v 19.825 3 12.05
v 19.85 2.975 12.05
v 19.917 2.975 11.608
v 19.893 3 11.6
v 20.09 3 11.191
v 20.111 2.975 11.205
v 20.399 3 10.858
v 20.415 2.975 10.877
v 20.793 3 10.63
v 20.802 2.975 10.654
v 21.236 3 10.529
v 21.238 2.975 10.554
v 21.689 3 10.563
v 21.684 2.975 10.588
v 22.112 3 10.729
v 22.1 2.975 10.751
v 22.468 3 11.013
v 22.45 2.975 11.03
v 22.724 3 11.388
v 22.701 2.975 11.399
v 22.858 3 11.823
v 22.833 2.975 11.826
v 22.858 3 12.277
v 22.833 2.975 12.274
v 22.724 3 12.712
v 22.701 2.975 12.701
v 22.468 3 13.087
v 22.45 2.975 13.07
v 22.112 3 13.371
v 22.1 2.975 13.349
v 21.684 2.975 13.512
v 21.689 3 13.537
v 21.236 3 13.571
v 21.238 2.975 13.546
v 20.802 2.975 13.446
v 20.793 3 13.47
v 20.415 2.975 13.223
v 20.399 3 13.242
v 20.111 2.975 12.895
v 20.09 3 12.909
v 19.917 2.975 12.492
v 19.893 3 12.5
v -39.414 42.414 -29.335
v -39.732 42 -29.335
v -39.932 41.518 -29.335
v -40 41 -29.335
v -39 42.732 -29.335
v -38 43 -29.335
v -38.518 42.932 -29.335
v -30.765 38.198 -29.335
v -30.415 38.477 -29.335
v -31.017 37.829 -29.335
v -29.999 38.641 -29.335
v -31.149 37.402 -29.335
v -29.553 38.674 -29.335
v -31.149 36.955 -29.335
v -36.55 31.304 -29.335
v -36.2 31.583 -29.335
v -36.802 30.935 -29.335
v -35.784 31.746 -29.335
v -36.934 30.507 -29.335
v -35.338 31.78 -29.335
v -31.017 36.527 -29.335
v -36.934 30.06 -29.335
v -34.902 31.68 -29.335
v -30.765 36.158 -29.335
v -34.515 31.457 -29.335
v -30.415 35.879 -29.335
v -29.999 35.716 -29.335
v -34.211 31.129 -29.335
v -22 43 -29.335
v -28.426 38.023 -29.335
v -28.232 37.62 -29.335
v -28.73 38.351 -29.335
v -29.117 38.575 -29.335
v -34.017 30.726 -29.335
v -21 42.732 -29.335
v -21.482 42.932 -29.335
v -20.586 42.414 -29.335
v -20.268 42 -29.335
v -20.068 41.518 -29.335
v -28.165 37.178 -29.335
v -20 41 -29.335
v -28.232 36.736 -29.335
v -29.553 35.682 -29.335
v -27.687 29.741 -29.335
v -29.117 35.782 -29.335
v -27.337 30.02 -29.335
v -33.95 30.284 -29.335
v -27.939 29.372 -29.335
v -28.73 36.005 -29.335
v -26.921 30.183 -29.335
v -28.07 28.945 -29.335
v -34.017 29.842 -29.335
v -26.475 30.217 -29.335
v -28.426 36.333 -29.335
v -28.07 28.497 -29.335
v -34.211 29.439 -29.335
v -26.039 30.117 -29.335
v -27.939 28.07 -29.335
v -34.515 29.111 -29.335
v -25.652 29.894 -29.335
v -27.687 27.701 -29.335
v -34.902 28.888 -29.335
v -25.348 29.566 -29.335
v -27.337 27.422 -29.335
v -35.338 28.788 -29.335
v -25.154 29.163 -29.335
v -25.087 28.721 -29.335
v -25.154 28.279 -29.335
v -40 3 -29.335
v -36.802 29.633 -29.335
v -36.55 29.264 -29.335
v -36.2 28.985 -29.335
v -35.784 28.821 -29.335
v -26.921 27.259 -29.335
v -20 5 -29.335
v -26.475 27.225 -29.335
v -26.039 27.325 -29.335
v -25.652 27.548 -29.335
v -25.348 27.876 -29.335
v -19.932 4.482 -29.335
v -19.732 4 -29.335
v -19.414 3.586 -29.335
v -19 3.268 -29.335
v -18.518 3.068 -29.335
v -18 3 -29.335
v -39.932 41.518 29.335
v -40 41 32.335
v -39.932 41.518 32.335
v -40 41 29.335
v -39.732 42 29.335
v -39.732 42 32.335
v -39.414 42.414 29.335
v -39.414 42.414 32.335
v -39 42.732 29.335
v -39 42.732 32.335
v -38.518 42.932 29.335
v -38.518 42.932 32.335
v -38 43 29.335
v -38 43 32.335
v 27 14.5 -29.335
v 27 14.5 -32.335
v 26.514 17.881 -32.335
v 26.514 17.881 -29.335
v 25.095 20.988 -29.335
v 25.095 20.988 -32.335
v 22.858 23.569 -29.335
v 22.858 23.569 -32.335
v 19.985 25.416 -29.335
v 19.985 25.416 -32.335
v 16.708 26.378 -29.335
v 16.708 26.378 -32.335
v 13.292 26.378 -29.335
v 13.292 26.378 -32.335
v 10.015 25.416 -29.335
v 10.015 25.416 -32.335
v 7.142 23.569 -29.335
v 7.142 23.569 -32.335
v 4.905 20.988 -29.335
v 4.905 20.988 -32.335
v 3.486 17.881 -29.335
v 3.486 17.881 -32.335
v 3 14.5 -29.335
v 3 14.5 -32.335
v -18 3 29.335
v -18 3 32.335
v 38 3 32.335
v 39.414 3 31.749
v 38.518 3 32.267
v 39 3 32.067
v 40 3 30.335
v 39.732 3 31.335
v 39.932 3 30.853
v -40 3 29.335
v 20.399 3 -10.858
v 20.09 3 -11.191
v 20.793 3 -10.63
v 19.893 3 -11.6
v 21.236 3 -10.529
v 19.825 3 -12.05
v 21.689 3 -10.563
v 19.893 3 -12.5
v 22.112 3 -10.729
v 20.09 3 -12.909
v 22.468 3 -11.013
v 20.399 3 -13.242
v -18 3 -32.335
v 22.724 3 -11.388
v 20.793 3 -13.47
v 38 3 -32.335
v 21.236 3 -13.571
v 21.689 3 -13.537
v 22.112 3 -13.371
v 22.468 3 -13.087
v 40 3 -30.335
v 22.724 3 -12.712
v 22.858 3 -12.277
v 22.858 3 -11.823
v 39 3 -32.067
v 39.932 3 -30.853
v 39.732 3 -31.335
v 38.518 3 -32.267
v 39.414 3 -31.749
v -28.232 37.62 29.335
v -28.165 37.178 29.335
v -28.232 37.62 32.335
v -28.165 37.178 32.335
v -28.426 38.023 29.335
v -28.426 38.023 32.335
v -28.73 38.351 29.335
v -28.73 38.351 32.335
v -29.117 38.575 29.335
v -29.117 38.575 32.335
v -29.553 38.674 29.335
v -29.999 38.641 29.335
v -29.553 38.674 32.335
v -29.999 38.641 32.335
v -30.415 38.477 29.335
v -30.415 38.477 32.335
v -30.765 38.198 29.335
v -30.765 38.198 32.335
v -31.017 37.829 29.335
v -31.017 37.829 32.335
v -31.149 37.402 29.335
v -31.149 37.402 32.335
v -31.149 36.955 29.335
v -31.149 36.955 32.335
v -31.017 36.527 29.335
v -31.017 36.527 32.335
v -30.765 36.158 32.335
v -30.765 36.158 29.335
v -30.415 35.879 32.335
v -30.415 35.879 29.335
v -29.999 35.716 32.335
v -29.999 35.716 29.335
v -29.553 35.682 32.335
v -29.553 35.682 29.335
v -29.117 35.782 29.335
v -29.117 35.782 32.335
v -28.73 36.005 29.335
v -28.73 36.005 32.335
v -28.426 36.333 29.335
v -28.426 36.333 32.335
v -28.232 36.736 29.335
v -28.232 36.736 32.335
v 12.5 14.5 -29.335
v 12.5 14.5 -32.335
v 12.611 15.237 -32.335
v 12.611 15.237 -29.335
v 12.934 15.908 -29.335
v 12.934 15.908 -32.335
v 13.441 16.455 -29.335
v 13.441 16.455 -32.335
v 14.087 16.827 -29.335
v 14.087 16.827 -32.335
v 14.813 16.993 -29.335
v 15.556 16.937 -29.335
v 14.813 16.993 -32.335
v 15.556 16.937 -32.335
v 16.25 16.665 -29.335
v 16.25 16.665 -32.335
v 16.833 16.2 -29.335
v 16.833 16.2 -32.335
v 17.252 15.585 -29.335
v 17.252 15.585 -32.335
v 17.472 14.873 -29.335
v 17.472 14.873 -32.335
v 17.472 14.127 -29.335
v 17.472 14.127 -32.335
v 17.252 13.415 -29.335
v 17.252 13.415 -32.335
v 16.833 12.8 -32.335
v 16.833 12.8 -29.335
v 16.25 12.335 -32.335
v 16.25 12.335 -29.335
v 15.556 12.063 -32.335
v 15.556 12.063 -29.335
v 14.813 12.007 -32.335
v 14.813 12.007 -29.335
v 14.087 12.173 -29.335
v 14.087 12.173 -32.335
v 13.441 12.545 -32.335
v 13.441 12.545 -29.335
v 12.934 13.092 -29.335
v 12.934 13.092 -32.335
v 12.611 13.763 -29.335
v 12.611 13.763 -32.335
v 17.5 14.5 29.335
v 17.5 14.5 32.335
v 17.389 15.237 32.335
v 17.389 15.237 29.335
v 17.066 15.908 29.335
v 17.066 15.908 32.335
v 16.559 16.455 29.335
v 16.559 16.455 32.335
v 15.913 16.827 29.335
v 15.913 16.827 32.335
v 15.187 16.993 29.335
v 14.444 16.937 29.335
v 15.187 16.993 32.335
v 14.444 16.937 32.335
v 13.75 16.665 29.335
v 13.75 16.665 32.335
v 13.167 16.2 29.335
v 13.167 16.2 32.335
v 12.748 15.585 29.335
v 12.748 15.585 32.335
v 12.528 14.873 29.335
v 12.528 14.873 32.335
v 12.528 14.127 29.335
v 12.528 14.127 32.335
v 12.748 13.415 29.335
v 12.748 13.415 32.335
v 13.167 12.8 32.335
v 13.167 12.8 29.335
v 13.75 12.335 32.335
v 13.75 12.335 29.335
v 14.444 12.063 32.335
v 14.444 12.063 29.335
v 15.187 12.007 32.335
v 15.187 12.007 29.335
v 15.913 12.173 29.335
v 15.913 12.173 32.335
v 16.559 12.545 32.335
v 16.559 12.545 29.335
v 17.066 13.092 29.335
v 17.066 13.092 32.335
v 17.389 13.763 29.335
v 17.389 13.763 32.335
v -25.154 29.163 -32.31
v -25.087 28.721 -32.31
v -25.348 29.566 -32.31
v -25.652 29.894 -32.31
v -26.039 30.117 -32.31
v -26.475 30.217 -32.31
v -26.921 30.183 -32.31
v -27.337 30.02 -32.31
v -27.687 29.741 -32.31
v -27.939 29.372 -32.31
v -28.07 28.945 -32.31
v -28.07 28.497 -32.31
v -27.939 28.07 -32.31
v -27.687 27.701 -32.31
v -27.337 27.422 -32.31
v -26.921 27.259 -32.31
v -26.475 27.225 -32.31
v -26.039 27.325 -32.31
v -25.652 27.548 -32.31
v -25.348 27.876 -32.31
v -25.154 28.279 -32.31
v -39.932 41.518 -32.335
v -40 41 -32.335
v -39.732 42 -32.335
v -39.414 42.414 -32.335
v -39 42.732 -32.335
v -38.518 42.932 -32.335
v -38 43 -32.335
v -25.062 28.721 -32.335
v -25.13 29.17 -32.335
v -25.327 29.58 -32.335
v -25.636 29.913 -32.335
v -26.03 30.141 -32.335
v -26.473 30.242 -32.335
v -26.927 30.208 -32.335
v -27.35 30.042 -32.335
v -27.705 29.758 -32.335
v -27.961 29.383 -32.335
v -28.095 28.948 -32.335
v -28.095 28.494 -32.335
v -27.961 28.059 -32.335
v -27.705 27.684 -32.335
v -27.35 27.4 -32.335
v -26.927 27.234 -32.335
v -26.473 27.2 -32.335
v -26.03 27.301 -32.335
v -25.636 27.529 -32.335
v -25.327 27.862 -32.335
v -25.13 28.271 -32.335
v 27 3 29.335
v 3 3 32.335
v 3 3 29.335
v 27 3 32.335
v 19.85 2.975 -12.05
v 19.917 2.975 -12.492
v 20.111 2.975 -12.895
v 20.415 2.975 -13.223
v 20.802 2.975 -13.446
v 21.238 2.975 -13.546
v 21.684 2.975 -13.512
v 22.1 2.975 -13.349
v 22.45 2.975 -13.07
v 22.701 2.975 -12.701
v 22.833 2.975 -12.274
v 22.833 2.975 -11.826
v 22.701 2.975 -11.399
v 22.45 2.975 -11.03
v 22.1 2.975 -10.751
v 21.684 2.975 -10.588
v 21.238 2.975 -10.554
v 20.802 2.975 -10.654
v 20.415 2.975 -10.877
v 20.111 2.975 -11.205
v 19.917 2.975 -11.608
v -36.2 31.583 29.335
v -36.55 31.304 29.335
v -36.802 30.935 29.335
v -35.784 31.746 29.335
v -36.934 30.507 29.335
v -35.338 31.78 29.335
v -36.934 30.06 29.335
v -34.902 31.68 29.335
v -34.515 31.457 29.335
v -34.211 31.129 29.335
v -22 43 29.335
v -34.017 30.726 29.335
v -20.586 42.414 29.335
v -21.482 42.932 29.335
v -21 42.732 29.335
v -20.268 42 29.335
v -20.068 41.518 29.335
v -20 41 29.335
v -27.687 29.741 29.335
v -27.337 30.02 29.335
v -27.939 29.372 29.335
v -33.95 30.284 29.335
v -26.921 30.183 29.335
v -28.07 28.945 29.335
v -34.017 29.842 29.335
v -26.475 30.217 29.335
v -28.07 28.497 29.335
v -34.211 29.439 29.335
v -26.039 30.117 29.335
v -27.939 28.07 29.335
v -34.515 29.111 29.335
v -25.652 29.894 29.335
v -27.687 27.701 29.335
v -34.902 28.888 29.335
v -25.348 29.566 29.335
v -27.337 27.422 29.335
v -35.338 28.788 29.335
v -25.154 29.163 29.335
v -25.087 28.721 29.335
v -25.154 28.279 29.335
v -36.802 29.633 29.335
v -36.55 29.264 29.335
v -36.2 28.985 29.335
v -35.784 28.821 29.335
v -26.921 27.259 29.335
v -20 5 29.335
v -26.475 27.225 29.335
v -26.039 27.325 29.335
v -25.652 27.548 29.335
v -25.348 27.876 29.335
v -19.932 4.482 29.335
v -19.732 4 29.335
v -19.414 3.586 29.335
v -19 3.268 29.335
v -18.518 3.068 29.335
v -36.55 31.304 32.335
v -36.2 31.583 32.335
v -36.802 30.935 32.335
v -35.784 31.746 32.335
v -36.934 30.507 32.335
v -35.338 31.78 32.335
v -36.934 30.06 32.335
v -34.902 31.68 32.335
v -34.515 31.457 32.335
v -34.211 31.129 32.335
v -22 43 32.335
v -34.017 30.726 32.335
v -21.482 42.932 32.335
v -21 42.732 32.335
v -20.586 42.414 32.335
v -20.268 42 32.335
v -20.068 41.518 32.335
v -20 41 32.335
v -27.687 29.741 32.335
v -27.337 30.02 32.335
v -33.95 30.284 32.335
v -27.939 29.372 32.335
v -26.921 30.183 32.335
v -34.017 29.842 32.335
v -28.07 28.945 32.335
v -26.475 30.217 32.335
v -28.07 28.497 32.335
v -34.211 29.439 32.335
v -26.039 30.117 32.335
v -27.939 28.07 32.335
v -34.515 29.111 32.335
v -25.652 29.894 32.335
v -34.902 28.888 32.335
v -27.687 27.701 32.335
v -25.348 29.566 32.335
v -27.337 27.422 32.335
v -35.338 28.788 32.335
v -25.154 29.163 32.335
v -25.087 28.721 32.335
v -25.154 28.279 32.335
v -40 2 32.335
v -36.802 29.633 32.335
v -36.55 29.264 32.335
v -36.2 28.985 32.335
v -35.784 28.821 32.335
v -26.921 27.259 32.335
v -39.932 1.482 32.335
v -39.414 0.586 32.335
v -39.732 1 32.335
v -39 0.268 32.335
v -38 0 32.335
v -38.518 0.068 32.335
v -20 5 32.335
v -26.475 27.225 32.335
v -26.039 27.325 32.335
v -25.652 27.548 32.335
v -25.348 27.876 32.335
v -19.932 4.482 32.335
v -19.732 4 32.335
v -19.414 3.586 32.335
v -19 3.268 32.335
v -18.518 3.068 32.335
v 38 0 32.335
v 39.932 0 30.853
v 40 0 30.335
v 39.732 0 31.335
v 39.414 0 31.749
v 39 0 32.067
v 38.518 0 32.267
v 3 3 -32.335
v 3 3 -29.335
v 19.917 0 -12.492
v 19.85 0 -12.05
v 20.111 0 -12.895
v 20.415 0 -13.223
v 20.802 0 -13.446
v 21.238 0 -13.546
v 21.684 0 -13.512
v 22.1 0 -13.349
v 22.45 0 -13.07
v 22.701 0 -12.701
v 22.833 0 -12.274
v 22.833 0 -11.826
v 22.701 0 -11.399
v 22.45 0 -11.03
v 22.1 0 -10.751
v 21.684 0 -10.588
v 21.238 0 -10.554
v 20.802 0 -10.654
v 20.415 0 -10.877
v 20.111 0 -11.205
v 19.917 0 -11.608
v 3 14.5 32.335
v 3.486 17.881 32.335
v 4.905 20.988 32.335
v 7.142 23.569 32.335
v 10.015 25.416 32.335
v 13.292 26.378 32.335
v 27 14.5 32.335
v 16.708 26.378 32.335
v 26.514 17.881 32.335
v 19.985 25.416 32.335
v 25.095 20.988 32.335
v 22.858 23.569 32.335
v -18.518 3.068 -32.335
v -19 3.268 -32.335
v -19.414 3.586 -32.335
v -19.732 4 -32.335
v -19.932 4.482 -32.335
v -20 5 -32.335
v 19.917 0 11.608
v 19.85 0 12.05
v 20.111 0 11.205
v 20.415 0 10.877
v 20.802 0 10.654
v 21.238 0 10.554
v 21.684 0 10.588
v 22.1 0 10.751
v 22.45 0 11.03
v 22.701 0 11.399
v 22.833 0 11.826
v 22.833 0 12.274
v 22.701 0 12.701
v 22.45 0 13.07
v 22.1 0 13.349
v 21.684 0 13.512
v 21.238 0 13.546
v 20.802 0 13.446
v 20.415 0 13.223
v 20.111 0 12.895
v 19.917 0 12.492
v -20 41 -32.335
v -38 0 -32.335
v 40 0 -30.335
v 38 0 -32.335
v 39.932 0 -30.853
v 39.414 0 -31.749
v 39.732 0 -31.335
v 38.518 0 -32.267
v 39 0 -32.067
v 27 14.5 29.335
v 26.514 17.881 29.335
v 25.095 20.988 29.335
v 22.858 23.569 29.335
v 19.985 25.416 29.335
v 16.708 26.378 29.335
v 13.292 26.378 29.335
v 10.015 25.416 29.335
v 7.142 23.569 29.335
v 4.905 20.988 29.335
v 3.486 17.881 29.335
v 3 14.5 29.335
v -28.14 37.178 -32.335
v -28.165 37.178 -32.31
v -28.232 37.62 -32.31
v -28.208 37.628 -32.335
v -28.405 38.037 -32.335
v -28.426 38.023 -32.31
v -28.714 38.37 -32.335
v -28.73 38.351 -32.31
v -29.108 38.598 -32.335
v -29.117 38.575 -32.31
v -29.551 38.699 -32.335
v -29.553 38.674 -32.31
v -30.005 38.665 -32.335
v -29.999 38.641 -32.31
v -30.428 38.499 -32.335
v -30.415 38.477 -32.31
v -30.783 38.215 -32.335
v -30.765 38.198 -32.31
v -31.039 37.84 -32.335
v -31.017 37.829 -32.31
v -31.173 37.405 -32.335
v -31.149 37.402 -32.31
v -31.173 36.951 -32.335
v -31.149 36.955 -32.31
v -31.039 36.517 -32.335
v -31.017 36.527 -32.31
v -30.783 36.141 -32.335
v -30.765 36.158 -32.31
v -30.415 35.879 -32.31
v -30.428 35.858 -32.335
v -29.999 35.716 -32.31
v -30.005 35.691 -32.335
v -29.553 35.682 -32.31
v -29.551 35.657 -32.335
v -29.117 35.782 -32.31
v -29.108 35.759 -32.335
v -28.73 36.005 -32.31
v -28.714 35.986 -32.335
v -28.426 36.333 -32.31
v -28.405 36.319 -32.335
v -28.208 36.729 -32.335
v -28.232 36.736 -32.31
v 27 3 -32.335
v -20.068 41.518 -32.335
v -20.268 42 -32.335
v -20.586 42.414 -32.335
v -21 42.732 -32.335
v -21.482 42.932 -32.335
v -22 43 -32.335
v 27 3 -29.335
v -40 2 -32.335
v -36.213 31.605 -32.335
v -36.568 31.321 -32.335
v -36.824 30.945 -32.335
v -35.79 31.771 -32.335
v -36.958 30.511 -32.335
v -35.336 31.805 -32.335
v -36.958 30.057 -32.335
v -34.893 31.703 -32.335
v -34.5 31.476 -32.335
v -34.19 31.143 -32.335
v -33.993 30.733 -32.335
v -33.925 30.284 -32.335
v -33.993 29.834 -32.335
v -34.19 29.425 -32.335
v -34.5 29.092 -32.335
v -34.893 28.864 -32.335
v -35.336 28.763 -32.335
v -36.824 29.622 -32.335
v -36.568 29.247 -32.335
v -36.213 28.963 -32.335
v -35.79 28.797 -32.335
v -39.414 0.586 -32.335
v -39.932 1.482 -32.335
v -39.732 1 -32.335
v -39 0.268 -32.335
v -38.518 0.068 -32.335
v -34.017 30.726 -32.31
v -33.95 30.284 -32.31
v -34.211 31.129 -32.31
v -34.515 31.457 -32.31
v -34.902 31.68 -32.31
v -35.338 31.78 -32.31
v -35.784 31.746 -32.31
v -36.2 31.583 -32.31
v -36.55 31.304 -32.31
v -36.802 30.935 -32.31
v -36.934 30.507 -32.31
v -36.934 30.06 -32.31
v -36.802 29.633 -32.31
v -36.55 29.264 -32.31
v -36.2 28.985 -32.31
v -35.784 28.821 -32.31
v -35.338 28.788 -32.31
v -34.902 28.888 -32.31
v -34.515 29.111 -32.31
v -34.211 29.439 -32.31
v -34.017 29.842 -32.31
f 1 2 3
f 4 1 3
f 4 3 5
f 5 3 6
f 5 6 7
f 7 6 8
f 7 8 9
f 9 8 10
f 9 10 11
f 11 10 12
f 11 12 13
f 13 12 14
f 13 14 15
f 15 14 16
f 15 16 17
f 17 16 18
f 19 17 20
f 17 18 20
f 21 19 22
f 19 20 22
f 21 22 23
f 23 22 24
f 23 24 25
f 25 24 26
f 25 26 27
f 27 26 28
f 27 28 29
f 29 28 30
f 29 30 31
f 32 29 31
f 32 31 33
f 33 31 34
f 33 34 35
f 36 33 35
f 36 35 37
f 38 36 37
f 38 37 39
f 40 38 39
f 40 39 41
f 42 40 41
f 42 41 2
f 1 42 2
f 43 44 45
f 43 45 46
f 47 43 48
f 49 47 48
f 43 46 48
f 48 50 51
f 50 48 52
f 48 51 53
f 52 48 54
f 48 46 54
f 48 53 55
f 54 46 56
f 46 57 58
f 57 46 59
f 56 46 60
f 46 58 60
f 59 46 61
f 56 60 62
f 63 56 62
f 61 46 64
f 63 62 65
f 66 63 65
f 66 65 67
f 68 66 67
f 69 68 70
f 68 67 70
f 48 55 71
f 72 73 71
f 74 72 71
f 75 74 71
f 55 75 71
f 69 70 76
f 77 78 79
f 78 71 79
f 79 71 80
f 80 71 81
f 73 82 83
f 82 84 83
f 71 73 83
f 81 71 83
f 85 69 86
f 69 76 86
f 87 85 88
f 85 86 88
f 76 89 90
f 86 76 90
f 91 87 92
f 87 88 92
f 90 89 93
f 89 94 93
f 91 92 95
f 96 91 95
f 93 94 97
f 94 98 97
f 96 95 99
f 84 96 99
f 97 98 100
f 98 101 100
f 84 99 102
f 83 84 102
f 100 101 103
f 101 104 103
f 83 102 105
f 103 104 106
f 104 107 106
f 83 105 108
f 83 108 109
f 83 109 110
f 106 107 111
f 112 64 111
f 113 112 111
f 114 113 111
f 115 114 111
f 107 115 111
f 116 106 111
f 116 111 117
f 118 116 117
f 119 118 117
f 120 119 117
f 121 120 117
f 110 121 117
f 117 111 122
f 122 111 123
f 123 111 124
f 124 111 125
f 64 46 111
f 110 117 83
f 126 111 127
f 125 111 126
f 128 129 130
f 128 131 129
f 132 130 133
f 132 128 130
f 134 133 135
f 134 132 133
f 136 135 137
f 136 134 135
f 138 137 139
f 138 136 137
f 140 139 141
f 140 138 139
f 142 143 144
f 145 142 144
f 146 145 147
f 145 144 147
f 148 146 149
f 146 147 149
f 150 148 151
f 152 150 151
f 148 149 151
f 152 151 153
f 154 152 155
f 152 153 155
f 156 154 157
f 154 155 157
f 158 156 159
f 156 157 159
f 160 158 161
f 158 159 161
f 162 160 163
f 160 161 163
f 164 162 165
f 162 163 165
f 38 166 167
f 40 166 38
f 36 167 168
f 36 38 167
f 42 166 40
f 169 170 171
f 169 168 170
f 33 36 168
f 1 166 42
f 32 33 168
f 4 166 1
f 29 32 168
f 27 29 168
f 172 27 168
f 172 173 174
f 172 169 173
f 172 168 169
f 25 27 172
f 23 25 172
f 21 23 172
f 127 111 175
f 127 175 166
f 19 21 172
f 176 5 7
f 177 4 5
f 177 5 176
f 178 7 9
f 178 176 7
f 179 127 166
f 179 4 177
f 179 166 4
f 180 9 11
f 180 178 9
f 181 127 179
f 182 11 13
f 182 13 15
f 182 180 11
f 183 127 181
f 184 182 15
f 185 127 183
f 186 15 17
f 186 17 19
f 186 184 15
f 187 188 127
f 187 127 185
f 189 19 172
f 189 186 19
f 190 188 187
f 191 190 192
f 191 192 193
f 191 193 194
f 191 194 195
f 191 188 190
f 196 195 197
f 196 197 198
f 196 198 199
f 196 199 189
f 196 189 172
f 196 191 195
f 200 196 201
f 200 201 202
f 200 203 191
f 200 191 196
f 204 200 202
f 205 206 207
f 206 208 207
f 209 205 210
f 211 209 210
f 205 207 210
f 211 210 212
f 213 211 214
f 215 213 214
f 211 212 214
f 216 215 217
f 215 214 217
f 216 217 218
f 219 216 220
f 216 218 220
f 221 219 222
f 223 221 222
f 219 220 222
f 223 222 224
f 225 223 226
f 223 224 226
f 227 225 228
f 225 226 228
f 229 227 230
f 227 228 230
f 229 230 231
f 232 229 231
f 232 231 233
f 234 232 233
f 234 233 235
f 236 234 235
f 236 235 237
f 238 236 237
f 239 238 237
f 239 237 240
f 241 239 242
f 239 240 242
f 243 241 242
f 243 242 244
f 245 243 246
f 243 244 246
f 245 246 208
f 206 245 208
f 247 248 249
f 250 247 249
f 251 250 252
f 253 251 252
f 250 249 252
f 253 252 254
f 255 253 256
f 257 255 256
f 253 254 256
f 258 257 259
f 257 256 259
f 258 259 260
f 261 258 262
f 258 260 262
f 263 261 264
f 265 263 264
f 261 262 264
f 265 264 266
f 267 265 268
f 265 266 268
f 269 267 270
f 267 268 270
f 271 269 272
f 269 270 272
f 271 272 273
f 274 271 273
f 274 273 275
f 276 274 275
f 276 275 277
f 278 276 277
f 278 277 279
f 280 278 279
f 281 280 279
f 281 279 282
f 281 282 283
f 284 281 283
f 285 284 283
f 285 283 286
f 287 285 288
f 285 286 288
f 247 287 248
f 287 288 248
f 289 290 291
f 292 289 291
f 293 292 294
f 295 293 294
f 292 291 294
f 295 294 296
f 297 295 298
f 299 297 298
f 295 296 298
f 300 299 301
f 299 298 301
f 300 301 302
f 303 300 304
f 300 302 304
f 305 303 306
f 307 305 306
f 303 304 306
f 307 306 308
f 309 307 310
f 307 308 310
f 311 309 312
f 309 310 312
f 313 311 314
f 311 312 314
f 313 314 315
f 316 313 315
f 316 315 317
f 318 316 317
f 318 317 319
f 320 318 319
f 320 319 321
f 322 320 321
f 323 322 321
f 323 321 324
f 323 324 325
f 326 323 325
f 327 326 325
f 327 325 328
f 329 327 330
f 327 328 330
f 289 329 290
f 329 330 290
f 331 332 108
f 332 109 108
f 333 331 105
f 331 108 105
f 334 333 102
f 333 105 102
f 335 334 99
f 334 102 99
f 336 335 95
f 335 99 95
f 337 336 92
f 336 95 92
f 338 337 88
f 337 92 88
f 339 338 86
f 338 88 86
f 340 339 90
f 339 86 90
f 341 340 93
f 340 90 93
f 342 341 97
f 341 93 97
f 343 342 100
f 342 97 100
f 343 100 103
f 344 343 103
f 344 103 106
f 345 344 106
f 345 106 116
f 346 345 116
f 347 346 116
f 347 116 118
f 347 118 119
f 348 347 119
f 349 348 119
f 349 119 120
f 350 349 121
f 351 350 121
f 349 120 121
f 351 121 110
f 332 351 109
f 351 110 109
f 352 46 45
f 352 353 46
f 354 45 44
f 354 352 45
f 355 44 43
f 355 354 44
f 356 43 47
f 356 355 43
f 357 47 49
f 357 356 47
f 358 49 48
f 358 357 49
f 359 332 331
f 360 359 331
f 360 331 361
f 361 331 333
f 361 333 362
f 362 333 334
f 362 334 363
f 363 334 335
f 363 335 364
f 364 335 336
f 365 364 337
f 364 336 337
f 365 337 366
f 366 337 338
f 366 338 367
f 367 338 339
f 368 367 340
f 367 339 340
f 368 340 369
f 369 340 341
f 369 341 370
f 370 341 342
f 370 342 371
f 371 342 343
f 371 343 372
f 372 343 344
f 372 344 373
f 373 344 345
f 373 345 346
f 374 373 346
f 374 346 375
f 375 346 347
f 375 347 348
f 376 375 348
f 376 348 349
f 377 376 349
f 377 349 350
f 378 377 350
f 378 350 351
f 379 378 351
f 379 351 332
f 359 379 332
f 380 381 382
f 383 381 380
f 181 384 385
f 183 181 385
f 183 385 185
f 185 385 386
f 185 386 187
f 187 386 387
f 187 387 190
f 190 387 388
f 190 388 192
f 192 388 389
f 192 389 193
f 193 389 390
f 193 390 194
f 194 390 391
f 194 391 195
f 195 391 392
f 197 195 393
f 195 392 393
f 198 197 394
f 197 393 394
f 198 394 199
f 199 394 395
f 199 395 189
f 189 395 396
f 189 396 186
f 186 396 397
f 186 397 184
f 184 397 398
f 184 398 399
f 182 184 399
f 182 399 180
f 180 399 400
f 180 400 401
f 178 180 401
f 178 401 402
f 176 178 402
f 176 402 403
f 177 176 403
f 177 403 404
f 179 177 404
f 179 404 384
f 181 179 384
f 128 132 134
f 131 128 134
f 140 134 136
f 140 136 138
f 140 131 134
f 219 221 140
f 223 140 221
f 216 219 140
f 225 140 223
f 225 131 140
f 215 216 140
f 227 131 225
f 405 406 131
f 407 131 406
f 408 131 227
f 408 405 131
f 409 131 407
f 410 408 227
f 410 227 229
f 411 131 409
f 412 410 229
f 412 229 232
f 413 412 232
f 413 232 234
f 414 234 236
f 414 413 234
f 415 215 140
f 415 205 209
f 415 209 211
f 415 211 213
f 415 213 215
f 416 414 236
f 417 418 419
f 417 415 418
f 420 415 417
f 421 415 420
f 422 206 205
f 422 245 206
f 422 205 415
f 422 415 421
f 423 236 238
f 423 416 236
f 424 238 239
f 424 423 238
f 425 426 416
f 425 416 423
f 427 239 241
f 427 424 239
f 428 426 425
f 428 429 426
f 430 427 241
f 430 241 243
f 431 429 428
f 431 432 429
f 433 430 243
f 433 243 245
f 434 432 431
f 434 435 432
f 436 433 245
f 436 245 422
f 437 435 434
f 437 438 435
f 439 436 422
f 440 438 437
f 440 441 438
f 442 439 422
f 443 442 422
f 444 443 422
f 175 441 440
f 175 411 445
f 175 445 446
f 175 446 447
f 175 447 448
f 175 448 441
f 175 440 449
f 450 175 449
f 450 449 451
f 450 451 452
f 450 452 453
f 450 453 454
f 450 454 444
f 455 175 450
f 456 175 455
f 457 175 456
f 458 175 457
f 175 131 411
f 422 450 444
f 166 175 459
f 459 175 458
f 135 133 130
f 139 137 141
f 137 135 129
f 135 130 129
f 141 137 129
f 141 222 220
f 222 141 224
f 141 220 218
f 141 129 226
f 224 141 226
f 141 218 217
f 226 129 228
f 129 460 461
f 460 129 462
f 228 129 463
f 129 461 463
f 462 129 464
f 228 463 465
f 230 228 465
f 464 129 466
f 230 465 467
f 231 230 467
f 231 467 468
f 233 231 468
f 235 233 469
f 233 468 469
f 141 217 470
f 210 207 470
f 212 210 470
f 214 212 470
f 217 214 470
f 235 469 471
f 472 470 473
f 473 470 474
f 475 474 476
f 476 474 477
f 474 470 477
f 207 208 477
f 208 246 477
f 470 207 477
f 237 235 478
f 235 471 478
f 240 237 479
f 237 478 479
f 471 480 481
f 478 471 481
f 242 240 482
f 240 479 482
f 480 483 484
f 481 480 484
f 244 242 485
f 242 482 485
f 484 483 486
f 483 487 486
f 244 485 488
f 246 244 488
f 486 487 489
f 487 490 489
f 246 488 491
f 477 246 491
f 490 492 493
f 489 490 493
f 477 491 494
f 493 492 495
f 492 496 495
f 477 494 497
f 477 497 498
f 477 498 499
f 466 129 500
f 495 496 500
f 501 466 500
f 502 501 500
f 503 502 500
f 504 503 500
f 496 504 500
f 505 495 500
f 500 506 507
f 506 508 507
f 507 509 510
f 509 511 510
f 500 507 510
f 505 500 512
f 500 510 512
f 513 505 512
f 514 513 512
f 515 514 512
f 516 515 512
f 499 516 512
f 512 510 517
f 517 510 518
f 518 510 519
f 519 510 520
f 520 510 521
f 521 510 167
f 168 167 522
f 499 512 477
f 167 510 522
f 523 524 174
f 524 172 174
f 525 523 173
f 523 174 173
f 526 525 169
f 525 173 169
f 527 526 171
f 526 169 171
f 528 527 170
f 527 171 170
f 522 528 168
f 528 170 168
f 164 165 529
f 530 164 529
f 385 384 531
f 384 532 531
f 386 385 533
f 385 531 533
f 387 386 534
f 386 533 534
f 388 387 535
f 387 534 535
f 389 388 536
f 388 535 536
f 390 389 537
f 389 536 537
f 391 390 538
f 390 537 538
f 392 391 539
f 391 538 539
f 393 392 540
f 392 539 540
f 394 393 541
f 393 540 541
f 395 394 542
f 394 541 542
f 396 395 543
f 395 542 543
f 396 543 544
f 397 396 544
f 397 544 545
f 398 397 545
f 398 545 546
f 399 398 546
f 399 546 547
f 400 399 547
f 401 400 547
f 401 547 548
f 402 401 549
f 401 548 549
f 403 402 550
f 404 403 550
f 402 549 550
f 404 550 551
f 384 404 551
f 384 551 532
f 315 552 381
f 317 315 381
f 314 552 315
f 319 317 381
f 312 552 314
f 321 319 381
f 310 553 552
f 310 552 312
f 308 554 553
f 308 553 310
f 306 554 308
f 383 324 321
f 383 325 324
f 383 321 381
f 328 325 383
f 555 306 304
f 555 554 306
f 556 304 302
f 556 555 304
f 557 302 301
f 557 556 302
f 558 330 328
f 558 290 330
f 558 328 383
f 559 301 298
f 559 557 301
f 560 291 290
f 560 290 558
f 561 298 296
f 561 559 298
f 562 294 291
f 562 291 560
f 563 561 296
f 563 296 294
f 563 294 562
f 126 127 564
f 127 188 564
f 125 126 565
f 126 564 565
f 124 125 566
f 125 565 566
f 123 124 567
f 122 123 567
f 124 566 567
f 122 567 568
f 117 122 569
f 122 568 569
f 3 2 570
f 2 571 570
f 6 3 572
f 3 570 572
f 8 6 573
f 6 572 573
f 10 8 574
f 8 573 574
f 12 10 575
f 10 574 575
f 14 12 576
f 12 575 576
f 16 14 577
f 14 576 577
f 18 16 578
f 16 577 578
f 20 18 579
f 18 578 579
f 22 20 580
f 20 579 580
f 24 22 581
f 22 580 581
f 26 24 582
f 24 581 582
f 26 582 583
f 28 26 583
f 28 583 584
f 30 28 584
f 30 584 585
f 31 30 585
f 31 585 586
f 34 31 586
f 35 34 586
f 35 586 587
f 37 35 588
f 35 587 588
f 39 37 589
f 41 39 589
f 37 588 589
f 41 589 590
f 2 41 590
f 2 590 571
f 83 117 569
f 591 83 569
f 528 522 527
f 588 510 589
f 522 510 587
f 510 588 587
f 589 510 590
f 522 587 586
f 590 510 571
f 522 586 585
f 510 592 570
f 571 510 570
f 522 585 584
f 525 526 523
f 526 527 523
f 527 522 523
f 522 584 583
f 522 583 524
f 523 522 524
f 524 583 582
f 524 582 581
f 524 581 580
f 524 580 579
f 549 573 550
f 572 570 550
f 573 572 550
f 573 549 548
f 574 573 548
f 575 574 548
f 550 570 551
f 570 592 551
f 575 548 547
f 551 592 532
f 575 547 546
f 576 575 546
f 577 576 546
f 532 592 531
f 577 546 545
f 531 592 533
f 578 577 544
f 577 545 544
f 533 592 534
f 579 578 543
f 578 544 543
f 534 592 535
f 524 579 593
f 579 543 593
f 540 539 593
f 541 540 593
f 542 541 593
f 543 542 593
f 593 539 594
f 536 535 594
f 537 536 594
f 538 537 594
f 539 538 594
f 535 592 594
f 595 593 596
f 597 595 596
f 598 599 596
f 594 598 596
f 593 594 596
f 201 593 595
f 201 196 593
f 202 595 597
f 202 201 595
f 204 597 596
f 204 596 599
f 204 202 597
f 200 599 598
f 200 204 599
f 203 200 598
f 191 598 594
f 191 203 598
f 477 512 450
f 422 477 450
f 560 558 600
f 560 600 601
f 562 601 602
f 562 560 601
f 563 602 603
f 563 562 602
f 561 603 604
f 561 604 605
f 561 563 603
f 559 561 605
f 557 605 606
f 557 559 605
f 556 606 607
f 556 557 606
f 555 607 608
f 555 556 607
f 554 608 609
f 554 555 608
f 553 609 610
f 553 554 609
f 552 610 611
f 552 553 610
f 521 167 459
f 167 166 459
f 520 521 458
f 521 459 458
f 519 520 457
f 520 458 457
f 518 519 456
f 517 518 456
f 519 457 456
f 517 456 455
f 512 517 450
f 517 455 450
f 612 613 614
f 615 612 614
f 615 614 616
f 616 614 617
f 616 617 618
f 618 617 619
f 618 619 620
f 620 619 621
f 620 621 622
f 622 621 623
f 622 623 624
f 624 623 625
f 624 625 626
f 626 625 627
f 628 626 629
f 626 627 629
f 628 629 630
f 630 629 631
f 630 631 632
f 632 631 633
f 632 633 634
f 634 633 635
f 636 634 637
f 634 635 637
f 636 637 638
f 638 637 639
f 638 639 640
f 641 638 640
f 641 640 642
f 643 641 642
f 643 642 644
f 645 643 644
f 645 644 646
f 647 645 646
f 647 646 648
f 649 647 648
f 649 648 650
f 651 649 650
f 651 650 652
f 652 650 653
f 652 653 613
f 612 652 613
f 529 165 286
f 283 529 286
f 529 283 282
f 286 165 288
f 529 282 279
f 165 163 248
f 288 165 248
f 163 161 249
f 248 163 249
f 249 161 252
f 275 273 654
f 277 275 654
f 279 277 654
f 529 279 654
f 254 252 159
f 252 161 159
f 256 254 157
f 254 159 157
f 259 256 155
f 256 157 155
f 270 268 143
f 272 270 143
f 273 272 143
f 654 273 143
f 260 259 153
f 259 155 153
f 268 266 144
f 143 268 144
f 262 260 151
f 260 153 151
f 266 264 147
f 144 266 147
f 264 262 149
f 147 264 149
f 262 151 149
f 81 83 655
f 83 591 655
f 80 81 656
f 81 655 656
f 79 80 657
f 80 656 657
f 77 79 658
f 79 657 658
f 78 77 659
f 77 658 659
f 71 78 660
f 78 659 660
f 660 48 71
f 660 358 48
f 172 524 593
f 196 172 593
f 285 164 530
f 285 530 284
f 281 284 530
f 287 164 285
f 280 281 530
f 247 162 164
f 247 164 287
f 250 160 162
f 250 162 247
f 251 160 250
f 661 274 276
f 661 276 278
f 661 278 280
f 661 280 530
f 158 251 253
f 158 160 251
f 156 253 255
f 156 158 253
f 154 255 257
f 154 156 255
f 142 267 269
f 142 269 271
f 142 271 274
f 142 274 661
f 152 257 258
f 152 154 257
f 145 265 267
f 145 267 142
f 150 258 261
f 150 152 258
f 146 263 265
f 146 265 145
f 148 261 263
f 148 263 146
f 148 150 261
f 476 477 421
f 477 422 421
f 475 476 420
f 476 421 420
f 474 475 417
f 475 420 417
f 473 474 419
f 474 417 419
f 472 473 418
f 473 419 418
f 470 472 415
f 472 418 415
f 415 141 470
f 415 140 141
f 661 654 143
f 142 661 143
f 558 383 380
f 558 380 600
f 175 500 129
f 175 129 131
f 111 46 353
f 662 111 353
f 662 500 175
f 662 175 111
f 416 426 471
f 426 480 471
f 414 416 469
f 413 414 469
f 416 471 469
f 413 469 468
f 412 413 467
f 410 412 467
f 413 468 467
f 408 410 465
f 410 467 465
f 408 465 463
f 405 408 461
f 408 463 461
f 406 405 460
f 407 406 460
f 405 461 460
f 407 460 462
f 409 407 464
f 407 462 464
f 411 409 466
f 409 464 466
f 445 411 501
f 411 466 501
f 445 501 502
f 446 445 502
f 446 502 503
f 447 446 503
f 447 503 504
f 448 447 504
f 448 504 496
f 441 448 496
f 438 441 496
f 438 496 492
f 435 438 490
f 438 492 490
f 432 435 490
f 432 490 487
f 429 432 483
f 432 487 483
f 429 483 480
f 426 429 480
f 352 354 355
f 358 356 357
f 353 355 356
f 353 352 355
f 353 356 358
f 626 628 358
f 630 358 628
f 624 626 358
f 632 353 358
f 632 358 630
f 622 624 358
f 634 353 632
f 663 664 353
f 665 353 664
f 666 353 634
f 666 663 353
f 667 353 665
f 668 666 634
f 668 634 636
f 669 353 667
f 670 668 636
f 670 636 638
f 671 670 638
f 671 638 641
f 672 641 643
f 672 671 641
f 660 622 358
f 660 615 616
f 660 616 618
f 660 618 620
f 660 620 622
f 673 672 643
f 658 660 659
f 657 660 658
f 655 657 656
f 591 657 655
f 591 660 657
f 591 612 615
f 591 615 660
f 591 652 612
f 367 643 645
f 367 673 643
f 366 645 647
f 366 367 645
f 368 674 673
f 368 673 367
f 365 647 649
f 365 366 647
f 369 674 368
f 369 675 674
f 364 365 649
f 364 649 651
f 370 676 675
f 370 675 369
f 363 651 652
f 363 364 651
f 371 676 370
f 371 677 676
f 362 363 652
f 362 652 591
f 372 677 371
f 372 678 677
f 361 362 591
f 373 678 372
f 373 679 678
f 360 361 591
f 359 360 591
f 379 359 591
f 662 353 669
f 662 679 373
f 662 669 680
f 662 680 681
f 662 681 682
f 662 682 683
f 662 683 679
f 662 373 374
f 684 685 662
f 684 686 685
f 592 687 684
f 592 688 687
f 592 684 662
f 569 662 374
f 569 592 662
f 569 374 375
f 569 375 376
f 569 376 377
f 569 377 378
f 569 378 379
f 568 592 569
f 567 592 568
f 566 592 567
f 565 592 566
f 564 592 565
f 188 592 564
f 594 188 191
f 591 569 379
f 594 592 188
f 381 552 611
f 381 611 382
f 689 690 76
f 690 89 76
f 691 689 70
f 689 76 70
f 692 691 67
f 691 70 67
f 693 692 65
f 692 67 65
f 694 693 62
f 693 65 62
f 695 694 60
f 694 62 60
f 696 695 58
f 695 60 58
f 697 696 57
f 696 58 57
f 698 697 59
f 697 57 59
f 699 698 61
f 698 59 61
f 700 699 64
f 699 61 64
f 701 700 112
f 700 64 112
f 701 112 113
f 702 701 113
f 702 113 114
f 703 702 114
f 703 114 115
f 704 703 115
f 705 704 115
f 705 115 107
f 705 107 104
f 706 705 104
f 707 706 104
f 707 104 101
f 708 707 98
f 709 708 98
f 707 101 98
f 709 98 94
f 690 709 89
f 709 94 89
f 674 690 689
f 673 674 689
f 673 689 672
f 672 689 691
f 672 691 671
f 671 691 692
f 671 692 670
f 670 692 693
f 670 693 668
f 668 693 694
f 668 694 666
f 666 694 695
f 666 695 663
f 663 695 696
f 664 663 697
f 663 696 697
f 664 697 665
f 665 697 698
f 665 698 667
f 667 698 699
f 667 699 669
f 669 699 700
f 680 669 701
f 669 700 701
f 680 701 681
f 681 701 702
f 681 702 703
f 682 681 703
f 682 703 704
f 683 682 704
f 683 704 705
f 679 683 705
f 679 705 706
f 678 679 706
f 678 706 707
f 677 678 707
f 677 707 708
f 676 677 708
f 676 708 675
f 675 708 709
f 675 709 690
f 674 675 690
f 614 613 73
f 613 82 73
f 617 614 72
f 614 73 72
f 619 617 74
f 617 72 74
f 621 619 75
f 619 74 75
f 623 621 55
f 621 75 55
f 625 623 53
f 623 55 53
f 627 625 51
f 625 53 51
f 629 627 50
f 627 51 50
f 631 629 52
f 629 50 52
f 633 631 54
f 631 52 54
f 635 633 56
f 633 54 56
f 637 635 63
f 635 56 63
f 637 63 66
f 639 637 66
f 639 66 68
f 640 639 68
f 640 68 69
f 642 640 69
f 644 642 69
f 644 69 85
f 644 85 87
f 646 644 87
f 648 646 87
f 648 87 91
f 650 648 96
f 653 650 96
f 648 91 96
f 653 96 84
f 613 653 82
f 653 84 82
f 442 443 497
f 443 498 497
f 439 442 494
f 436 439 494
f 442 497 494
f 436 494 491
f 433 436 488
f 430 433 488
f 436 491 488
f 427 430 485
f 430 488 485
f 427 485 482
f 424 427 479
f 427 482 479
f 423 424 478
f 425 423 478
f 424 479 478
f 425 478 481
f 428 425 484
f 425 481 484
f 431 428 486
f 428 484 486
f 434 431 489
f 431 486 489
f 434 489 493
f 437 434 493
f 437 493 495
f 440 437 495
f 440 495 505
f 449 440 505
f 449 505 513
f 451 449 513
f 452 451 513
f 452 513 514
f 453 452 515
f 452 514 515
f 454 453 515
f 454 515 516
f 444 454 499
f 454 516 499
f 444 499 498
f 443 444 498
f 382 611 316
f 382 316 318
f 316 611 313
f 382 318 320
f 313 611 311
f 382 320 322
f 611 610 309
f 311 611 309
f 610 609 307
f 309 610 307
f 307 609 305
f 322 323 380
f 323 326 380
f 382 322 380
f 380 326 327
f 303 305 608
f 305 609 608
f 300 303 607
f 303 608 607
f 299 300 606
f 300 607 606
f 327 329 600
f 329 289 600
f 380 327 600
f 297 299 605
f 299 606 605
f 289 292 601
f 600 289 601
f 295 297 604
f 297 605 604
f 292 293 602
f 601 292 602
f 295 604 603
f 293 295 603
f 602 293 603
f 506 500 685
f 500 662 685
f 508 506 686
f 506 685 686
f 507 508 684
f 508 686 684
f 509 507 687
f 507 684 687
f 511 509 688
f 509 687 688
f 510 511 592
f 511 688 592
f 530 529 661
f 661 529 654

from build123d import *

# Parameters (mm, degrees)
SKETCH1_W                       = 80
SKETCH1_H                       = 64.67
BOSS_EXTRUDE1_DEPTH             = 3
SKETCH2_W                       = 20
SKETCH2_H                       = 3
BOSS_EXTRUDE2_DEPTH             = 40
F_3_0MM_DOWEL_HOLE1_D           = 3
F_3_0MM_DOWEL_HOLE1_CSINK_D     = 3.05
F_3_0MM_DOWEL_HOLE1_CSINK_ANGLE = 90
FILLET1_R                       = 2
F_3_0MM_DOWEL_HOLE2_D           = 3
F_3_0MM_DOWEL_HOLE2_CSINK_D     = 3.05
F_3_0MM_DOWEL_HOLE2_CSINK_ANGLE = 90
SKETCH9_R                       = 2.5
BOSS_EXTRUDE3_DEPTH             = 3
SKETCH10_R                      = 2.5
BOSS_EXTRUDE4_DEPTH             = 3


with BuildPart() as part:
    # Sketch1 → Boss-Extrude1 (new body)
    with BuildSketch(Plane(origin=(0, 0, 0), x_dir=(1, 0, 0), z_dir=(0, 1, 0))):
        Rectangle(SKETCH1_W, SKETCH1_H)
    extrude(amount=BOSS_EXTRUDE1_DEPTH)

    # Sketch2 → Boss-Extrude2 (add)
    with BuildSketch(Plane(origin=(0, 3, 0), x_dir=(1, 0, 0), z_dir=(0, 1, 0))):
        with Locations((-30, 30.835)):
            Rectangle(SKETCH2_W, SKETCH2_H)
        with Locations((-30, -30.835)):
            Rectangle(SKETCH2_W, SKETCH2_H)
    extrude(amount=BOSS_EXTRUDE2_DEPTH)

    # Ø3.0mm Dowel Hole1 (through all)
    with Locations(Plane(origin=(0, 0, -32.335), x_dir=(-1, 0, 0), z_dir=(0, 0, -1))):
        with Locations((26.587155595, 28.720962624), (35.450420321, 30.283824867), (29.665309553, 37.178206159)):
            CounterSinkHole(F_3_0MM_DOWEL_HOLE1_D / 2, F_3_0MM_DOWEL_HOLE1_CSINK_D / 2, counter_sink_angle=F_3_0MM_DOWEL_HOLE1_CSINK_ANGLE)

    # Fillet1
    fillet1_edges = [part.edges().sort_by_distance(p)[0] for p in [
        (-20, 3, -30.835),
        (-40, 43, -30.835),
        (-20, 43, -30.835),
        (-20, 3, 30.835),
        (-40, 43, 30.835),
        (-20, 43, 30.835),
        (-40, 0, 0),
        (40, 1.5, 32.335),
        (40, 1.5, -32.335),
    ]]
    fillet(fillet1_edges, radius=FILLET1_R)

    # Ø3.0mm Dowel Hole2 (through all)
    with Locations(Plane(origin=(0, 3, 0), x_dir=(1, 0, 0), z_dir=(0, 1, 0))):
        with Locations((21.35, 12.05), (21.35, -12.05)):
            CounterSinkHole(F_3_0MM_DOWEL_HOLE2_D / 2, F_3_0MM_DOWEL_HOLE2_CSINK_D / 2, counter_sink_angle=F_3_0MM_DOWEL_HOLE2_CSINK_ANGLE)


with BuildPart() as body_2:
    # Sketch9 → Boss-Extrude3 (new body)
    with BuildSketch(Plane(origin=(0, 0, -32.335), x_dir=(-1, 0, 0), z_dir=(0, 0, -1))):
        with BuildLine():
            Line((-27, 3), (-27, 14.5))
            ThreePointArc((-27, 14.5), (-15, 26.5), (-3, 14.5))
            Line((-3, 14.5), (-3, 3))
            Line((-3, 3), (-27, 3))
        make_face()
        with Locations((-15, 14.5)):
            Circle(SKETCH9_R, mode=Mode.SUBTRACT)
    extrude(amount=-BOSS_EXTRUDE3_DEPTH)


with BuildPart() as body_3:
    # Sketch10 → Boss-Extrude4 (new body)
    with BuildSketch(Plane.XY.offset(32.335)):
        with BuildLine():
            Line((3, 3), (27, 3))
            Line((27, 3), (27, 14.5))
            ThreePointArc((27, 14.5), (15, 26.5), (3, 14.5))
            Line((3, 14.5), (3, 3))
        make_face()
        with Locations((15, 14.5)):
            Circle(SKETCH10_R, mode=Mode.SUBTRACT)
    extrude(amount=-BOSS_EXTRUDE4_DEPTH)


solid = Compound([part.part, body_2.part, body_3.part])
